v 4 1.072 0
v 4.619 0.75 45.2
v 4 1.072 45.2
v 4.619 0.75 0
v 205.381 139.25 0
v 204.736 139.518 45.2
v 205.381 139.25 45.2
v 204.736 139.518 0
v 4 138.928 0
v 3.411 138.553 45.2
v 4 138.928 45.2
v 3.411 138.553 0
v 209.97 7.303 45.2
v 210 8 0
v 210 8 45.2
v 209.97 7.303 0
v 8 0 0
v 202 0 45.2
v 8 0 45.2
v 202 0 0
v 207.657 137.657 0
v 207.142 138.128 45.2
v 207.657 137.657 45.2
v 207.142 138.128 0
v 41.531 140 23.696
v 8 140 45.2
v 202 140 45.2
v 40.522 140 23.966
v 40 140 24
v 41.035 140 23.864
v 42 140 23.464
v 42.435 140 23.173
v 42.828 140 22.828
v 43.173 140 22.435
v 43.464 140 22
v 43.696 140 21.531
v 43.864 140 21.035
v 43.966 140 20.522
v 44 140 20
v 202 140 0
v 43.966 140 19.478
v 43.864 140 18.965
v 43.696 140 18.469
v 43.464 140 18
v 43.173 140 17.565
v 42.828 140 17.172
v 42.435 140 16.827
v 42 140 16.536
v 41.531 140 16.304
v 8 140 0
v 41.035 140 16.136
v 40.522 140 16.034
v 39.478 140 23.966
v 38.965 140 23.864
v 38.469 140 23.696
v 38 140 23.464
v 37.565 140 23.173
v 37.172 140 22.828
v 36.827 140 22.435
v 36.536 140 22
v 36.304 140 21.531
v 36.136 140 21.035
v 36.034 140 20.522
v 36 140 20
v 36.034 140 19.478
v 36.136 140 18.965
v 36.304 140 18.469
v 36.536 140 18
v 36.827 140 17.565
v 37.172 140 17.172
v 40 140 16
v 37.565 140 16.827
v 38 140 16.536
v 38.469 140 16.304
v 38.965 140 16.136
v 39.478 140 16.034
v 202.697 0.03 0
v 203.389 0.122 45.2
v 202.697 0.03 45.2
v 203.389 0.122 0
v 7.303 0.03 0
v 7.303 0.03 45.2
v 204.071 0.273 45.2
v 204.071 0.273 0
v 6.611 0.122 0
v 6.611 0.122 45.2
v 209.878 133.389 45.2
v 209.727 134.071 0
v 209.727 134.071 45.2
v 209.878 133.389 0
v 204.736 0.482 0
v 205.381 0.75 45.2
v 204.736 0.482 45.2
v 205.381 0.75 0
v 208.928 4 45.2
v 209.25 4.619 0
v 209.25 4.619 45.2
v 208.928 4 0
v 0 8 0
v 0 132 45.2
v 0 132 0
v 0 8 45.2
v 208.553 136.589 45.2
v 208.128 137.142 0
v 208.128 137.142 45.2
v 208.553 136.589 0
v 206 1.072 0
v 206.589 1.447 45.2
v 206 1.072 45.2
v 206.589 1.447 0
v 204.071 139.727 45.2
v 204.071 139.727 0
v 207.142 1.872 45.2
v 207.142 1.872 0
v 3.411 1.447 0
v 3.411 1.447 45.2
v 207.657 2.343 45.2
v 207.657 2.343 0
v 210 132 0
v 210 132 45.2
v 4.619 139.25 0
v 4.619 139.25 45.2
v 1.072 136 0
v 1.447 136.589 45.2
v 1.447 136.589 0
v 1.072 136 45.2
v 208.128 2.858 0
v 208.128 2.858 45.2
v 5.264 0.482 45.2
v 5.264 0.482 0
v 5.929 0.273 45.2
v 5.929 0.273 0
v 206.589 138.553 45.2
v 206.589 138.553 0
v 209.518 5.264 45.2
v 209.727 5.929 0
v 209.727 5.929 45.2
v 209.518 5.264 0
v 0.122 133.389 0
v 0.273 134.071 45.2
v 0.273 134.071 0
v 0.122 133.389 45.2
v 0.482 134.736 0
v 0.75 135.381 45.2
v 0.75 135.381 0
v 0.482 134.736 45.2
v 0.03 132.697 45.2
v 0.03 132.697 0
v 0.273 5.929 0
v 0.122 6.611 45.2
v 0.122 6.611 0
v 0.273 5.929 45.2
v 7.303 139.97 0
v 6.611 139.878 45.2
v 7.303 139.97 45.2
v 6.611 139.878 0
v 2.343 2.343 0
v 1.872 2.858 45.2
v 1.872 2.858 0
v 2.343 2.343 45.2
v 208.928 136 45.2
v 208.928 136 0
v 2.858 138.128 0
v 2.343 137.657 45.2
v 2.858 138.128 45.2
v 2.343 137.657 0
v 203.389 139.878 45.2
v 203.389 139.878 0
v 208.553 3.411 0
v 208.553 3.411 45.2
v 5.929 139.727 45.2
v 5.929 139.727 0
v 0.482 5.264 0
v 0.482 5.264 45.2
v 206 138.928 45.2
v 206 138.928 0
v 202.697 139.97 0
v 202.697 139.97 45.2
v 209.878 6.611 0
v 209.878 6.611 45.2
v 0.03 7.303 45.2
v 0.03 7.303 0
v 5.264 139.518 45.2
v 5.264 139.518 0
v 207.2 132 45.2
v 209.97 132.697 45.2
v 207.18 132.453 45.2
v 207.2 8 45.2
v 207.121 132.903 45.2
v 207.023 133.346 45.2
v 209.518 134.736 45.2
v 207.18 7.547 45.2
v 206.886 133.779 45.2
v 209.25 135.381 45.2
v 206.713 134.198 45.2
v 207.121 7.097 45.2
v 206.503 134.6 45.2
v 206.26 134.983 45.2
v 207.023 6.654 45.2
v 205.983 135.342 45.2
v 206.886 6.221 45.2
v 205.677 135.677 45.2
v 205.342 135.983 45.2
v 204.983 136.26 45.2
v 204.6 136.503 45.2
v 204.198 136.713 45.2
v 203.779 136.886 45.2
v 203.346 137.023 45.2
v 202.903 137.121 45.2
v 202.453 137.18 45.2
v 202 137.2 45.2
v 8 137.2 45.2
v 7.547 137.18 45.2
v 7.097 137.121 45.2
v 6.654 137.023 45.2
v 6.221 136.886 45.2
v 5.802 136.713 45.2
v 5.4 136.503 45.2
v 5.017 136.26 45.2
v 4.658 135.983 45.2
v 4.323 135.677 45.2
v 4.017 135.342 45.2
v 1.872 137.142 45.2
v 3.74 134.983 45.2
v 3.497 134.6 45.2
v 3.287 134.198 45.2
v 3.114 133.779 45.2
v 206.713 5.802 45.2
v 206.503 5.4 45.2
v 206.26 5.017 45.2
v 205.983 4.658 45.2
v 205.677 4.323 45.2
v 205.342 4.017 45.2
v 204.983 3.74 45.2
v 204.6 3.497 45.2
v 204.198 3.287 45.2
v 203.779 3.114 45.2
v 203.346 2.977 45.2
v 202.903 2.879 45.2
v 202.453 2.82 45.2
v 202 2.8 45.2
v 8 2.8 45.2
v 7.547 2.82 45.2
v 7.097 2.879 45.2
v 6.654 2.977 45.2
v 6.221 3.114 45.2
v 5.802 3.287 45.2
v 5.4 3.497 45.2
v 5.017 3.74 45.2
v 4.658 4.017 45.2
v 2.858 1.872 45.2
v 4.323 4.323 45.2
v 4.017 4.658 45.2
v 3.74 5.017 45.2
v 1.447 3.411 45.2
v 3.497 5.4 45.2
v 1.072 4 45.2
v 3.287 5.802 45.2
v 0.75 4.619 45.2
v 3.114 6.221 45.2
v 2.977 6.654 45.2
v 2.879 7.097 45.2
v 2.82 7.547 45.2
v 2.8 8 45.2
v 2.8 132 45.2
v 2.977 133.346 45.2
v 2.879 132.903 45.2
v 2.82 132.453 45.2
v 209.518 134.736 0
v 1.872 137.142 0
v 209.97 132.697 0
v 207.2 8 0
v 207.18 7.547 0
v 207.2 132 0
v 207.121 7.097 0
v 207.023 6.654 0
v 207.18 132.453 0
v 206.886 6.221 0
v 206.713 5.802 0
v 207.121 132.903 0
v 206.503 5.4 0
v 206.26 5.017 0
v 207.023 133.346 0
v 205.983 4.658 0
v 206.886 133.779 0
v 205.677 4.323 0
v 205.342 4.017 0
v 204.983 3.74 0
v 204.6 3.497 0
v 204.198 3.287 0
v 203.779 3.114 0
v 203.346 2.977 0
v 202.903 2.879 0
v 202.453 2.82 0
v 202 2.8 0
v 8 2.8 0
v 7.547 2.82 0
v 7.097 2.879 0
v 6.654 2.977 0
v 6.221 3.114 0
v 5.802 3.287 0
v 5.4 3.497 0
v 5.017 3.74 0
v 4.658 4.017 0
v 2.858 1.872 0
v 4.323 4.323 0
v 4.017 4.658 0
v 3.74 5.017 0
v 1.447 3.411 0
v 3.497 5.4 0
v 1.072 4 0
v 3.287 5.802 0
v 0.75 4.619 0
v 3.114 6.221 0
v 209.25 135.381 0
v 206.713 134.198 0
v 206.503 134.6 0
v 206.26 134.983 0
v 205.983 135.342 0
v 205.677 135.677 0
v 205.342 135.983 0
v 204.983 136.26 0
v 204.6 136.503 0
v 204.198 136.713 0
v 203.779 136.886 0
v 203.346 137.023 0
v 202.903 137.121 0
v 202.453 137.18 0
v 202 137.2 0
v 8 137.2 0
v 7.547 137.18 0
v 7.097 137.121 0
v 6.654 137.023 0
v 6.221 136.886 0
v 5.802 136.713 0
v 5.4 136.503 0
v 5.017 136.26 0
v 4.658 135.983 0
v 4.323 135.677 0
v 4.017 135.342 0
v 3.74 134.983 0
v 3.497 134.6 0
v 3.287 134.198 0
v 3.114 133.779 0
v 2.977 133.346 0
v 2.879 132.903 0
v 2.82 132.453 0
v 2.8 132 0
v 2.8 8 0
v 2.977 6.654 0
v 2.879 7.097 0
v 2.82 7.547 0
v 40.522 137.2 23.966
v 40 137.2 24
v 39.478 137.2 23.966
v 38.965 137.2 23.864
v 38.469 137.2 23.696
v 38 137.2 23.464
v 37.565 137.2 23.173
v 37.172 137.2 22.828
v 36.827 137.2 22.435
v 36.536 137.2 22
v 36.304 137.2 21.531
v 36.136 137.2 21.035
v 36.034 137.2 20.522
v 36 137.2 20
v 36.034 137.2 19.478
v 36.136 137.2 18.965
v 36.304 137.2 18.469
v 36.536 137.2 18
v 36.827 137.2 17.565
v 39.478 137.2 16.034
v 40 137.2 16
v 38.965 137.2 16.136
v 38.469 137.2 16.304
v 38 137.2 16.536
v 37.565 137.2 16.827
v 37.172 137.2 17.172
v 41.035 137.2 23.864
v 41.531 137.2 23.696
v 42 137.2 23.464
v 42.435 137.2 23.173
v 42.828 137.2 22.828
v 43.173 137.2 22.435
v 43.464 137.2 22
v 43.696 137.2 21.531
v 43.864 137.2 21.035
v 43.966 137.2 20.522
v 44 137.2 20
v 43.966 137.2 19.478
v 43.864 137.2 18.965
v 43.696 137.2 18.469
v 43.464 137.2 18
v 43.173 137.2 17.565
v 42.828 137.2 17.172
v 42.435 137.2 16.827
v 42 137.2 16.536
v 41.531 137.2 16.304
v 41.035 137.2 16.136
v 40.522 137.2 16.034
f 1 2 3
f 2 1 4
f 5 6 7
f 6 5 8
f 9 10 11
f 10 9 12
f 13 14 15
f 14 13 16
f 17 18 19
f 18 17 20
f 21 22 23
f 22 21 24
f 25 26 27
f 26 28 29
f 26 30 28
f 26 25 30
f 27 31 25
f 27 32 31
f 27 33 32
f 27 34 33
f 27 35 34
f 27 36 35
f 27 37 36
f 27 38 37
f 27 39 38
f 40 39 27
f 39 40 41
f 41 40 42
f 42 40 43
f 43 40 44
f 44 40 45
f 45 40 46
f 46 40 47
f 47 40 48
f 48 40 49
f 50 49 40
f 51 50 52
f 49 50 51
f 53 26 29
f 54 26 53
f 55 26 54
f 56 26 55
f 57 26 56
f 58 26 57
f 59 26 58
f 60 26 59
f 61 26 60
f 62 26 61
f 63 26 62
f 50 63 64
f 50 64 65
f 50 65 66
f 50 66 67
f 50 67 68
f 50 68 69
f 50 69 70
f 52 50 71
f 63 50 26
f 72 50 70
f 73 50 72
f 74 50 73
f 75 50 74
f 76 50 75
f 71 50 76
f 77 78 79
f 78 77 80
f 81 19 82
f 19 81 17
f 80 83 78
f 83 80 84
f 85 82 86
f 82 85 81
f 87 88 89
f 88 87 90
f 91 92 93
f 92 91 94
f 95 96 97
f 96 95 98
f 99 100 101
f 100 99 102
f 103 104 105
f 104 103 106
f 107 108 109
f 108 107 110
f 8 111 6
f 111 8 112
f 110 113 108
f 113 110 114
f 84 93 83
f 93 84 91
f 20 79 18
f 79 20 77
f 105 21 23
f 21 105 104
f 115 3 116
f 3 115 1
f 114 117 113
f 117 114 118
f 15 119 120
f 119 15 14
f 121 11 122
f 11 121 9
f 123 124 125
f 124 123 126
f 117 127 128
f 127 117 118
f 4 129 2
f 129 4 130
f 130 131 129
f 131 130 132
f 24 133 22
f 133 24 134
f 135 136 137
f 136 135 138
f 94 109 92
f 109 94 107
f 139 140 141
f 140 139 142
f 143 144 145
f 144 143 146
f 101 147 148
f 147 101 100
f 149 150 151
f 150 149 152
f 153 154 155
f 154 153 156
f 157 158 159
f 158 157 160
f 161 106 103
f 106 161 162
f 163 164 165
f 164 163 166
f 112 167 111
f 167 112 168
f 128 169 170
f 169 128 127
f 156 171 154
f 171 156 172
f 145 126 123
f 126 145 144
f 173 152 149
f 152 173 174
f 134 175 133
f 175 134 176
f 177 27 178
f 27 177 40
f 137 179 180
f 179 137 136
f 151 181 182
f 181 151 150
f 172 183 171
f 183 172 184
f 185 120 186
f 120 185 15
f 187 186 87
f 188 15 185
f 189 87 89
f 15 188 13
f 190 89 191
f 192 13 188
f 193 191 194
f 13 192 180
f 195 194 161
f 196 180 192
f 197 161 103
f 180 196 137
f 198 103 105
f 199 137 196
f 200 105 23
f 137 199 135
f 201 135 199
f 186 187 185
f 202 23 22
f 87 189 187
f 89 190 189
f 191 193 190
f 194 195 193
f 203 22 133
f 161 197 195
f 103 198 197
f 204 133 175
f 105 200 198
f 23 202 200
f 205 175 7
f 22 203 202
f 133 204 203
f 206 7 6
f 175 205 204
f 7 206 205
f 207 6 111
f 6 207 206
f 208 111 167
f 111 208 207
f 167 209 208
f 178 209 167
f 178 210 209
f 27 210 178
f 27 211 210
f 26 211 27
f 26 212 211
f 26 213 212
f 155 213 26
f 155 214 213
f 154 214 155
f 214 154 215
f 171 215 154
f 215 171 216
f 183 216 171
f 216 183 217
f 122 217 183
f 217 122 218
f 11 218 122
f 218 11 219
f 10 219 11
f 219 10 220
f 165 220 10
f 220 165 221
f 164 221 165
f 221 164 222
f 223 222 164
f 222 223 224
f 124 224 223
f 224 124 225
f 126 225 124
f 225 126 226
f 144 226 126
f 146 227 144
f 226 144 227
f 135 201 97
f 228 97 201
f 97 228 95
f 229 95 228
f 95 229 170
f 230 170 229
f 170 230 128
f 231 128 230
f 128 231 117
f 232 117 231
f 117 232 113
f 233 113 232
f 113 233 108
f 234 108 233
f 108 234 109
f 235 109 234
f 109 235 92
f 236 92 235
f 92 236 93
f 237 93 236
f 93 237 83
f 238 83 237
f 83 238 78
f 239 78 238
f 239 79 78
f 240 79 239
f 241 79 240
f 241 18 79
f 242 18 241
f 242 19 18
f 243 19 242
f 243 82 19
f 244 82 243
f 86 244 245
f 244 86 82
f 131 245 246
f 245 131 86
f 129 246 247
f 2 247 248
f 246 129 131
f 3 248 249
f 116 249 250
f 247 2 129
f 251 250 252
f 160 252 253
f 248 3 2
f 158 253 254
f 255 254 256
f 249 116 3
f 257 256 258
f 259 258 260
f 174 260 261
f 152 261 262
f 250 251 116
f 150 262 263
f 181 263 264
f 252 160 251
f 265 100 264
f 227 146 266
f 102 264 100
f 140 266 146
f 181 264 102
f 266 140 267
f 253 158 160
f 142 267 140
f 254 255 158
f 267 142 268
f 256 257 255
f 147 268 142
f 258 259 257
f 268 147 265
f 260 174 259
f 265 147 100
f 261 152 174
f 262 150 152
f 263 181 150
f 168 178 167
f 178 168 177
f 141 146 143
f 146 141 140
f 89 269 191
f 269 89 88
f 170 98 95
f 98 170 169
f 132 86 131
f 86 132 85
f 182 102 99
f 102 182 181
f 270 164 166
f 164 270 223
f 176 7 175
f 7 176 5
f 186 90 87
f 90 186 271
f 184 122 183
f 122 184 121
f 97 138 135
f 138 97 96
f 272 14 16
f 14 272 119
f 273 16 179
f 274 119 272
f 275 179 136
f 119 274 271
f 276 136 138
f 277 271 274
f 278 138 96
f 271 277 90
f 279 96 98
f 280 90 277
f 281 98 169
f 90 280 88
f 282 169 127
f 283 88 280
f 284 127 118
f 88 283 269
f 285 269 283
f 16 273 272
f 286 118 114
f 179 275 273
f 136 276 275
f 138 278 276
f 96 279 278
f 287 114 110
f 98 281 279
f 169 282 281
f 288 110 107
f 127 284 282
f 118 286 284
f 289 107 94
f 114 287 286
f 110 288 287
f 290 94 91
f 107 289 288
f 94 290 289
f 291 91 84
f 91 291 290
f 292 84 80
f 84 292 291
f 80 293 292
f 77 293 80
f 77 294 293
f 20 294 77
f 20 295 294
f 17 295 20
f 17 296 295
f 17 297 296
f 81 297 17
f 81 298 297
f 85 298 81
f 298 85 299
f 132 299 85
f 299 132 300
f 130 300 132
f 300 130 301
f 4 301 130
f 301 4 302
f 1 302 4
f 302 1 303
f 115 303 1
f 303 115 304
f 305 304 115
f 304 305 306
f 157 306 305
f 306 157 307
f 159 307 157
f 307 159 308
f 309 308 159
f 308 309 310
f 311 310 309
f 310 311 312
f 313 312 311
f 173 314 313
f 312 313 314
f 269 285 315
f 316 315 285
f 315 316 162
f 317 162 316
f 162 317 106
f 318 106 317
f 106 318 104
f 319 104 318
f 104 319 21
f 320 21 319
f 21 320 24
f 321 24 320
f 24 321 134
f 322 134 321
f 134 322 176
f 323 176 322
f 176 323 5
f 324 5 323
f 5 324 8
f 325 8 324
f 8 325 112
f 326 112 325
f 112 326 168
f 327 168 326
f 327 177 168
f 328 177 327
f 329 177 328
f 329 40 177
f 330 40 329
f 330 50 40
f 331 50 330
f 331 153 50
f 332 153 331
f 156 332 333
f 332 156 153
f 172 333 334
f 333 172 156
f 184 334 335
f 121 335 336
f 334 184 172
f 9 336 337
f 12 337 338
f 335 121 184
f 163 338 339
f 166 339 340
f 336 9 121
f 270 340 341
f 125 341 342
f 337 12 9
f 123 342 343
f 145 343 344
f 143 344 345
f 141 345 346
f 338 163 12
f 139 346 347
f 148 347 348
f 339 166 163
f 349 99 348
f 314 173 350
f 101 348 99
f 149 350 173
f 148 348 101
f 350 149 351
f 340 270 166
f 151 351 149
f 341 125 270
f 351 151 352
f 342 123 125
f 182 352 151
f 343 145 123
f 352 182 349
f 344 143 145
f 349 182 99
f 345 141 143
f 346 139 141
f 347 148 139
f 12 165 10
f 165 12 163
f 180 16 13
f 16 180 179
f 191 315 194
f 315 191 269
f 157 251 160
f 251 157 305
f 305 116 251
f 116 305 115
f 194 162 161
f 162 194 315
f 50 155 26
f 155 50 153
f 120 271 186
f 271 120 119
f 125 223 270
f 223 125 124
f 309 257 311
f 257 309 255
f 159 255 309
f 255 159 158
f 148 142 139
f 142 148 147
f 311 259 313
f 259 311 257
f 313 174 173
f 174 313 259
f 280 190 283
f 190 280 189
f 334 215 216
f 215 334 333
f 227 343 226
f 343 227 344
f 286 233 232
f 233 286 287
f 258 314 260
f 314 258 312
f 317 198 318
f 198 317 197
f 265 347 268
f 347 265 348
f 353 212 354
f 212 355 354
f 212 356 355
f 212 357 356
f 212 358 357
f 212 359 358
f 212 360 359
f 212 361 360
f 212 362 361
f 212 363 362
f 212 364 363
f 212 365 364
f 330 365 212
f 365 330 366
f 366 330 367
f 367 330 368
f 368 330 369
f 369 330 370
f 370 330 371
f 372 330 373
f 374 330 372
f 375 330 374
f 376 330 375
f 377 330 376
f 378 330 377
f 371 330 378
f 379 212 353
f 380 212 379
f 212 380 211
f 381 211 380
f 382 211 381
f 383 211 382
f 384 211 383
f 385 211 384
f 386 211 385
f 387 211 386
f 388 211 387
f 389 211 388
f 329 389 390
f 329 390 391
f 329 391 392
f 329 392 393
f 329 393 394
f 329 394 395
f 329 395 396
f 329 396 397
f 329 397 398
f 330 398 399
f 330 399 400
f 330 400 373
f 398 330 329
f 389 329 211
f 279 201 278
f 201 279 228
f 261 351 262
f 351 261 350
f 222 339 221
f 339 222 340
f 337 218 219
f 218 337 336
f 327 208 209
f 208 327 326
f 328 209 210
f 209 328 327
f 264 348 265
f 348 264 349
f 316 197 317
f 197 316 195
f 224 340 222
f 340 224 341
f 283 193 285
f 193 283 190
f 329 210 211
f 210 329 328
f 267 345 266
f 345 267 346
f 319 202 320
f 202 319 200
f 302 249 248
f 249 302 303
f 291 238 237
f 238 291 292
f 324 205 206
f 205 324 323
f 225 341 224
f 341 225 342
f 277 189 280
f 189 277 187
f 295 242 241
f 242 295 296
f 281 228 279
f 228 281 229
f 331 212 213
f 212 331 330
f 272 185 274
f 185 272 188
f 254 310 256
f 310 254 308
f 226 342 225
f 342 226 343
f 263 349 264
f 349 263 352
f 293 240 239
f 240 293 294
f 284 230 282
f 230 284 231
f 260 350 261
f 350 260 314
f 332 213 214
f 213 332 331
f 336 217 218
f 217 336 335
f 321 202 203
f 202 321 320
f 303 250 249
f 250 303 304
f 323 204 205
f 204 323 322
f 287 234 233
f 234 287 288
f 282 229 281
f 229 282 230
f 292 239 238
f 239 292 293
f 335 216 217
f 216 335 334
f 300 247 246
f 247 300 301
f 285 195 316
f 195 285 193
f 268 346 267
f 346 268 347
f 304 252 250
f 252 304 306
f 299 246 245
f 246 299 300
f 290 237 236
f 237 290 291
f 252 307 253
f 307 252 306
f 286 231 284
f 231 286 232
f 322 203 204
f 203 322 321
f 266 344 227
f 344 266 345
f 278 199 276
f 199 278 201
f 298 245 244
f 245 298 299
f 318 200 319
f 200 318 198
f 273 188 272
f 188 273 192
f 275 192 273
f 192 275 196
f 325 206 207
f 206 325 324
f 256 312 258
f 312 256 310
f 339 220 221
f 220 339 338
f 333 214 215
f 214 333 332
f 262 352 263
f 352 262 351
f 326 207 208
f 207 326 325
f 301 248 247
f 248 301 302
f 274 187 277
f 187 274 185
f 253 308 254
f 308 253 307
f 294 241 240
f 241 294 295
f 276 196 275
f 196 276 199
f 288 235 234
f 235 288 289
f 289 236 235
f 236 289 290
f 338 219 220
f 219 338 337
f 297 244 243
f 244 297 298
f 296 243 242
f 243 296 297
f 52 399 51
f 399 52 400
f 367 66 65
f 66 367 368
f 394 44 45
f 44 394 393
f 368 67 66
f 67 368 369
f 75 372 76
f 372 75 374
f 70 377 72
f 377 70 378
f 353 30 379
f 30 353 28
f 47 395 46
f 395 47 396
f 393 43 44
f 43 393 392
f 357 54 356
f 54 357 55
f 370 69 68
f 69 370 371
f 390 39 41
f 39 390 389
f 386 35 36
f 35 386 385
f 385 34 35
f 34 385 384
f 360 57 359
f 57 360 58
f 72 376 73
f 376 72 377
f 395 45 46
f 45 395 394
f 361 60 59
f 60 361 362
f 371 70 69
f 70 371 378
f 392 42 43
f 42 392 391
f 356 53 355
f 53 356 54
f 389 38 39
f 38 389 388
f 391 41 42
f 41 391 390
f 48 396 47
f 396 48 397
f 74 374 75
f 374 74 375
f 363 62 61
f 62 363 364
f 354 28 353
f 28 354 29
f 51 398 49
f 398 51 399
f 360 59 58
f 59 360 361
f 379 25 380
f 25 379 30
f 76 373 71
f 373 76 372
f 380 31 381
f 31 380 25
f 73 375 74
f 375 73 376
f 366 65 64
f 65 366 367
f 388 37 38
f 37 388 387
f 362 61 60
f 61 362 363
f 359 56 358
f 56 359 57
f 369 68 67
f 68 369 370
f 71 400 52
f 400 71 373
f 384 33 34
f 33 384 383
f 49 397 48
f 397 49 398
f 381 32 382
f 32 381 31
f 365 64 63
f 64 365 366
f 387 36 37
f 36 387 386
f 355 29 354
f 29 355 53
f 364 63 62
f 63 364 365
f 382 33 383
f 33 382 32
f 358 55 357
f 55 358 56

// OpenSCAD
// file: top_panel_layout.scad
// GENERATED by tools/gen_top_panel.py -- DO NOT EDIT BY HAND
//
// Top-panel layout shared by the laser template and the printed lid.
// enclosure/top_panel_cutout.svg is generated from these same numbers,
// so a change here reaches both routes at once. Edit the generator, not
// this file.
//
// Coordinates are OpenSCAD-native: origin front-left, Y up, mm.

PANEL_W  = 210;
PANEL_H  = 140;   // depth in plan view
CORNER_R = 8;
PANEL_T  = 2.8;   // top face thickness

// dia 10 x 3 mm coin motors, 0.4 mm total fit clearance
MOTOR_DIA_NOM  = 10;
MOTOR_T        = 3;
MOTOR_HOLE_DIA = 10.4;
// dots 1-6 in order
MOTOR_POS = [ [37, 114], [37, 84], [37, 54], [67, 114], [67, 84], [67, 54] ];

// 12 x 12 x 6 mm 4-pin tactile switches, square cutout
BTN_BODY     = 12;
BTN_HOLE     = 12.4;
BTN_HOLE_R   = 0.5;
// dots 1-6 then submit
BTN_POS = [ [143, 114], [143, 84], [143, 54], [173, 114], [173, 84], [173, 54], [158, 24] ];

// perforated area dia 34.5 mm, under a dia 40 mm speaker
SPEAKER_DIA    = 40;
GRILL_HOLE_DIA = 2.5;
GRILL_POS = [ [105, 28], [105, 33.5], [109.763, 30.75], [109.763, 25.25], [105, 22.5], [100.237, 25.25], [100.237, 30.75], [105, 39], [110.5, 37.5263], [114.526, 33.5], [116, 28], [114.526, 22.5], [110.5, 18.4737], [105, 17], [99.5, 18.4737], [95.4737, 22.5], [94, 28], [95.4737, 33.5], [99.5, 37.5263], [105, 44], [110.472, 43.0351], [115.285, 40.2567], [118.856, 36], [120.757, 30.7784], [120.757, 25.2216], [118.856, 20], [115.285, 15.7433], [110.472, 12.9649], [105, 12], [99.5277, 12.9649], [94.7154, 15.7433], [91.1436, 20], [89.2431, 25.2216], [89.2431, 30.7784], [91.1436, 36], [94.7154, 40.2567], [99.5277, 43.0351] ];

// M3 clearance
SCREW_DIA = 3.2;
SCREW_POS = [ [8, 132], [202, 132], [8, 8], [202, 8] ];
// main file
// ====================================================================
// AI-Assisted Bangla Braille Tutor - side walls, parametric
//
// This is the middle part of a THREE-piece enclosure:
//
//   1. top_panel.stl        -- the flat top panel (already printed).
//   2. case_walls.scad      -- THIS FILE: an open-top, open-bottom frame
//                               that the top panel rests on.
//   3. case_base.scad       -- a flat cover that closes the bottom.
//
// It shares PANEL_W, PANEL_H and CORNER_R with the top panel (via
// top_panel_layout.scad), so its footprint and corner radius match the
// already-printed panel exactly -- the panel sits flush on this frame's
// top rim, no separate measuring needed.
//
// It carries no top face and none of the panel's cutouts (motor, button,
// speaker, screw) -- those already exist on the printed panel. It is
// just a hollow tube, plus the wire pass-through hole.
//
// Height: the brief is a total assembled height of 2 in (50.8 mm), ground
// to top panel. The top panel (2.8 mm) sits on top of these walls, and
// the base cover (2.8 mm) sits underneath, so:
//     wall_height = 50.8 - 2.8 (panel) - 2.8 (base) = 45.2 mm
//
// The four M3 screws drop straight down through the panel's SCREW_POS,
// through this frame's open interior (the screw positions sit inboard of
// the wall thickness, so nothing here needs its own screw holes), into
// the bosses on case_base.scad.
//
// Compatible with OpenSCAD / FreeCAD.
// ====================================================================

include <top_panel_layout.scad>

$fn = 72;   // smooth circles

// --- Frame ----------------------------------------------------------
wall_width     = PANEL_W;    // 210, identical to the top panel
wall_depth     = PANEL_H;    // 140, identical to the top panel
wall_height    = 45.2;       // 50.8 total - 2.8 top panel - 2.8 base cover
wall_thickness = 2.8;        // matches the top panel's thickness
corner_radius  = CORNER_R;   // 8, identical to the top panel -> edges always align

// Wire pass-through: a round hole through the back wall, offset to one
// side rather than centred, for the power/USB cable to leave the case.
wire_hole_dia = 8.0;
wire_hole_x   = 40;   // off to one side of the back wall, not its centre (105)
wire_hole_z   = 20;   // within the wall's height, clear of both rims


// --- Modules ----------------------------------------------------------

module rounded_box(w, d, h, r) {
    hull() {
        translate([r, r, 0])         cylinder(r = r, h = h);
        translate([w - r, r, 0])     cylinder(r = r, h = h);
        translate([r, d - r, 0])     cylinder(r = r, h = h);
        translate([w - r, d - r, 0]) cylinder(r = r, h = h);
    }
}

module wire_pass_hole() {
    translate([wire_hole_x, wall_depth - wall_thickness - 1, wire_hole_z])
        rotate([-90, 0, 0])
            cylinder(d = wire_hole_dia, h = wall_thickness + 2, $fn = 48);
}

module side_walls() {
    difference() {
        rounded_box(wall_width, wall_depth, wall_height, corner_radius);

        // hollow out the interior -- open top, open bottom
        translate([wall_thickness, wall_thickness, -1])
            rounded_box(
                wall_width  - 2 * wall_thickness,
                wall_depth  - 2 * wall_thickness,
                wall_height + 2,
                corner_radius - wall_thickness
            );

        wire_pass_hole();
    }
}

side_walls();
